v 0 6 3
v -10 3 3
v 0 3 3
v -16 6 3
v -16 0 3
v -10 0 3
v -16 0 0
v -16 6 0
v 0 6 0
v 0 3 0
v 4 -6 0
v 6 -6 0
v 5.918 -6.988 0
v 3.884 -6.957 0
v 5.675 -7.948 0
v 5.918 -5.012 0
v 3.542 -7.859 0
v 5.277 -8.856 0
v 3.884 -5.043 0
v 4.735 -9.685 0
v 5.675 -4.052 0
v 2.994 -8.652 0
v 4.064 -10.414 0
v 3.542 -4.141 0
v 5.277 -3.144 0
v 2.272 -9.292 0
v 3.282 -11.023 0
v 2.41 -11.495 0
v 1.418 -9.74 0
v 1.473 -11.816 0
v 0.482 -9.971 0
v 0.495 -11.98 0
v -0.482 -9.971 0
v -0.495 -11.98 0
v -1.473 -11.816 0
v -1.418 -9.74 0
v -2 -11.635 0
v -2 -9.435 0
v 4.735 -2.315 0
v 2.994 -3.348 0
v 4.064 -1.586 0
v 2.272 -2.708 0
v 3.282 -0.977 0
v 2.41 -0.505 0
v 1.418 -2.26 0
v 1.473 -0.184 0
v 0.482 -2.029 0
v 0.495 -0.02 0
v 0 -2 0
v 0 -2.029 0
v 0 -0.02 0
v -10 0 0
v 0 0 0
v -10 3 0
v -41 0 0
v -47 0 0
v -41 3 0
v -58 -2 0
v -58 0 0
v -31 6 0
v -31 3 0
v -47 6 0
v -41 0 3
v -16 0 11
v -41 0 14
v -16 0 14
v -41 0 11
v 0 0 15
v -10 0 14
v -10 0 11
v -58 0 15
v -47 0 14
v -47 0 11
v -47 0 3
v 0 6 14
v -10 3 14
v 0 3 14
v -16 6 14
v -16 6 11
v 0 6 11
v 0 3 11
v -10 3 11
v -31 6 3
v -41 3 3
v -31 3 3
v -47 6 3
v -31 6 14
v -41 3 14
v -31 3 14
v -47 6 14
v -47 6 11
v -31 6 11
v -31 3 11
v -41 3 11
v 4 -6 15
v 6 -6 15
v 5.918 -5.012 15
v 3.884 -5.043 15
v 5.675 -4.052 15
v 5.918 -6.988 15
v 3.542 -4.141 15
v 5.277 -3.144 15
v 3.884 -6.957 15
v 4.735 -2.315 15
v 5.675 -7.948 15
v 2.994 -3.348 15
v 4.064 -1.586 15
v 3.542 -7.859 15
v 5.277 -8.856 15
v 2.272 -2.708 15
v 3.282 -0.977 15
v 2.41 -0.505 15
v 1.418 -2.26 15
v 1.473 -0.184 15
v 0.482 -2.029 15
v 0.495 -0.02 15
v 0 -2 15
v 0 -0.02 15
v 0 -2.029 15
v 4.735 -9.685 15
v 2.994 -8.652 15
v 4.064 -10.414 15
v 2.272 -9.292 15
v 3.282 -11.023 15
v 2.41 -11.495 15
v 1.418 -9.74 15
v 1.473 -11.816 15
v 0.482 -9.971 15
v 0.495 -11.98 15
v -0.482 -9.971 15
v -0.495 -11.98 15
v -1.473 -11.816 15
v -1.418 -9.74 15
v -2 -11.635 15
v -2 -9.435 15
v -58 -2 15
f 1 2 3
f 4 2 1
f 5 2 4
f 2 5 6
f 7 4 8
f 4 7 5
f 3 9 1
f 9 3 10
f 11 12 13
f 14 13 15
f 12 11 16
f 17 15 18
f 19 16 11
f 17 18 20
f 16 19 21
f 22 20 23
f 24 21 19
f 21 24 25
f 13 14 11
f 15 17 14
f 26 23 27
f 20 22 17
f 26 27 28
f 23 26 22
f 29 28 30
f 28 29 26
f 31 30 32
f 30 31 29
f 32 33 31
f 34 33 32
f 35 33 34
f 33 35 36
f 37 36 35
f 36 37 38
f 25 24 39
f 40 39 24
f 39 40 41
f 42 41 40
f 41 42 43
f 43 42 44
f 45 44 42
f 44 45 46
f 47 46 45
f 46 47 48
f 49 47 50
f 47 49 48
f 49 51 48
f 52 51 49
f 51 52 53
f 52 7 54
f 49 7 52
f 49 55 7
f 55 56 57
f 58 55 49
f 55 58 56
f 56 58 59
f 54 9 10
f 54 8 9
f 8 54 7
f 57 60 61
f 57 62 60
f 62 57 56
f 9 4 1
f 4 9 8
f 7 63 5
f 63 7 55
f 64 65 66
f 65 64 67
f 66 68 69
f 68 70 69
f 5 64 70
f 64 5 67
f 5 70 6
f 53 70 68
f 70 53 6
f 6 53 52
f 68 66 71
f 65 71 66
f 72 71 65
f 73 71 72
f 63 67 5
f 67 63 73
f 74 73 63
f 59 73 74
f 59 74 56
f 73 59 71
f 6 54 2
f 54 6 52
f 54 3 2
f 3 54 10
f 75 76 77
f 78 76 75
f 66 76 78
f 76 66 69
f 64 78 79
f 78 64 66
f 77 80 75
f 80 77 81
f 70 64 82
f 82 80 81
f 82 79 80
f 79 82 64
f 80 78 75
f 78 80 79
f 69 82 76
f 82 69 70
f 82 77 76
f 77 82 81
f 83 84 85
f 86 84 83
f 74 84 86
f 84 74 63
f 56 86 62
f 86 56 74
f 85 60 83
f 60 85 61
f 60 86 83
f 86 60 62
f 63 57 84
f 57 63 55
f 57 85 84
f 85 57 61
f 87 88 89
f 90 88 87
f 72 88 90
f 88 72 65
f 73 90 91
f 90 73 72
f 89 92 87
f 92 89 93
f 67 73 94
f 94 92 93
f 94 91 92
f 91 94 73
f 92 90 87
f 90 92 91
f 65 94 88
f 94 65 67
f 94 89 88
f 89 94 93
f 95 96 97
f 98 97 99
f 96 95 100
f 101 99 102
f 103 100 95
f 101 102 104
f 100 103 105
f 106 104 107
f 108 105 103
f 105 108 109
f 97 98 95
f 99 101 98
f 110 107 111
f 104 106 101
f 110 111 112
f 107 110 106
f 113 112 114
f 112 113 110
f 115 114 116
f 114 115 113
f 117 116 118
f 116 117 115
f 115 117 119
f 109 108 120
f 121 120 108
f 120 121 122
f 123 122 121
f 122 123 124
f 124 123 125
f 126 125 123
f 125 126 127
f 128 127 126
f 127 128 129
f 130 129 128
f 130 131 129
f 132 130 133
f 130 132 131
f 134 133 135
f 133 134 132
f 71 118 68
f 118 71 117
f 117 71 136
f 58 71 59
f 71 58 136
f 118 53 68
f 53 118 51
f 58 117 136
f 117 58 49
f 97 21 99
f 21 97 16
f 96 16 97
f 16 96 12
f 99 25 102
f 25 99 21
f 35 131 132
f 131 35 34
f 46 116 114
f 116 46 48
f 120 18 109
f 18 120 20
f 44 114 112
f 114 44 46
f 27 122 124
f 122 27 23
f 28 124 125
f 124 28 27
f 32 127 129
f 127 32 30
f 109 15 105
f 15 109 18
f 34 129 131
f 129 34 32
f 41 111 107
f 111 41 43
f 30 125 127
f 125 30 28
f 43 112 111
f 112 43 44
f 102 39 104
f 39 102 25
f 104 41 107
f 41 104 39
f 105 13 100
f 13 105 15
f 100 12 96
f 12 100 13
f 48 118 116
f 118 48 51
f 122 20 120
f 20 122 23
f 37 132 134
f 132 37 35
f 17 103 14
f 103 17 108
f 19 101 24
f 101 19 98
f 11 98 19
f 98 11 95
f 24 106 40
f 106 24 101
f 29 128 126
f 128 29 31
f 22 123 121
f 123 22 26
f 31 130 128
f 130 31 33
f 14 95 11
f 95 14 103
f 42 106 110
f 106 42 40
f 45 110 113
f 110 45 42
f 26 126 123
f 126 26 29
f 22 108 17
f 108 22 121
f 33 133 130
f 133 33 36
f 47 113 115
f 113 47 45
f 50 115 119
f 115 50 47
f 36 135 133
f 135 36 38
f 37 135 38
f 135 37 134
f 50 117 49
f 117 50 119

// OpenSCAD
$fa= 1;
$fs= 1;


hook_t = 3;
hook_h = 16;
hook_l_h = 10;
hook_l_d = 3;
hook_d = 6;

slot_h = 18;
slot_w = 4;
slot_t = 2.2;
slot_sp_v = 13;
slot_sp_h = 6.5;
slot_sp_v_c2c = slot_sp_v+slot_h;
slot_sp_h_c2c = 15-4;
bar_w = 25;



rotate([0,-90,0])
hook_plate();

difference() {
	translate([0,-6,0])
	cylinder( r=6, h=15 );
	
	translate([0,-6,-1])
	cylinder( r=4, h=17 );
	translate([-8,-12,-1])
	cube([6,10,17]);
	translate([-6,-8,-1])
	cube([6,6,17]);
}




module hook_plate()
{	
	//translate([-15/2,0,0])
	hook_set();
	//translate([-bar_w/2,-3,0])
	translate([0,-2,0])
	cube([15,2,58]);
}


module hook_set()
{	
	// make sure overlap
	translate([0,-0,01,0])
	{
	
	hook();
	translate([slot_sp_h_c2c,0,0])
	hook();
	translate([0,0,slot_sp_v_c2c])
	hook();
	translate([slot_sp_h_c2c,0,slot_sp_v_c2c])
	hook();

	}
}

module hook()
{
	difference()
	{
		cube([hook_t,hook_d,hook_h]);
	
		translate([-1,-1,-1])
		cube([hook_t+2,hook_l_d+1,1+hook_l_h]);
	
		*translate([-1,0,hook_l_h-hook_l_d])
		rotate([0,90,0])
		#cylinder( r = hook_l_d, h = hook_t+2);
	
	} // end diff


}
